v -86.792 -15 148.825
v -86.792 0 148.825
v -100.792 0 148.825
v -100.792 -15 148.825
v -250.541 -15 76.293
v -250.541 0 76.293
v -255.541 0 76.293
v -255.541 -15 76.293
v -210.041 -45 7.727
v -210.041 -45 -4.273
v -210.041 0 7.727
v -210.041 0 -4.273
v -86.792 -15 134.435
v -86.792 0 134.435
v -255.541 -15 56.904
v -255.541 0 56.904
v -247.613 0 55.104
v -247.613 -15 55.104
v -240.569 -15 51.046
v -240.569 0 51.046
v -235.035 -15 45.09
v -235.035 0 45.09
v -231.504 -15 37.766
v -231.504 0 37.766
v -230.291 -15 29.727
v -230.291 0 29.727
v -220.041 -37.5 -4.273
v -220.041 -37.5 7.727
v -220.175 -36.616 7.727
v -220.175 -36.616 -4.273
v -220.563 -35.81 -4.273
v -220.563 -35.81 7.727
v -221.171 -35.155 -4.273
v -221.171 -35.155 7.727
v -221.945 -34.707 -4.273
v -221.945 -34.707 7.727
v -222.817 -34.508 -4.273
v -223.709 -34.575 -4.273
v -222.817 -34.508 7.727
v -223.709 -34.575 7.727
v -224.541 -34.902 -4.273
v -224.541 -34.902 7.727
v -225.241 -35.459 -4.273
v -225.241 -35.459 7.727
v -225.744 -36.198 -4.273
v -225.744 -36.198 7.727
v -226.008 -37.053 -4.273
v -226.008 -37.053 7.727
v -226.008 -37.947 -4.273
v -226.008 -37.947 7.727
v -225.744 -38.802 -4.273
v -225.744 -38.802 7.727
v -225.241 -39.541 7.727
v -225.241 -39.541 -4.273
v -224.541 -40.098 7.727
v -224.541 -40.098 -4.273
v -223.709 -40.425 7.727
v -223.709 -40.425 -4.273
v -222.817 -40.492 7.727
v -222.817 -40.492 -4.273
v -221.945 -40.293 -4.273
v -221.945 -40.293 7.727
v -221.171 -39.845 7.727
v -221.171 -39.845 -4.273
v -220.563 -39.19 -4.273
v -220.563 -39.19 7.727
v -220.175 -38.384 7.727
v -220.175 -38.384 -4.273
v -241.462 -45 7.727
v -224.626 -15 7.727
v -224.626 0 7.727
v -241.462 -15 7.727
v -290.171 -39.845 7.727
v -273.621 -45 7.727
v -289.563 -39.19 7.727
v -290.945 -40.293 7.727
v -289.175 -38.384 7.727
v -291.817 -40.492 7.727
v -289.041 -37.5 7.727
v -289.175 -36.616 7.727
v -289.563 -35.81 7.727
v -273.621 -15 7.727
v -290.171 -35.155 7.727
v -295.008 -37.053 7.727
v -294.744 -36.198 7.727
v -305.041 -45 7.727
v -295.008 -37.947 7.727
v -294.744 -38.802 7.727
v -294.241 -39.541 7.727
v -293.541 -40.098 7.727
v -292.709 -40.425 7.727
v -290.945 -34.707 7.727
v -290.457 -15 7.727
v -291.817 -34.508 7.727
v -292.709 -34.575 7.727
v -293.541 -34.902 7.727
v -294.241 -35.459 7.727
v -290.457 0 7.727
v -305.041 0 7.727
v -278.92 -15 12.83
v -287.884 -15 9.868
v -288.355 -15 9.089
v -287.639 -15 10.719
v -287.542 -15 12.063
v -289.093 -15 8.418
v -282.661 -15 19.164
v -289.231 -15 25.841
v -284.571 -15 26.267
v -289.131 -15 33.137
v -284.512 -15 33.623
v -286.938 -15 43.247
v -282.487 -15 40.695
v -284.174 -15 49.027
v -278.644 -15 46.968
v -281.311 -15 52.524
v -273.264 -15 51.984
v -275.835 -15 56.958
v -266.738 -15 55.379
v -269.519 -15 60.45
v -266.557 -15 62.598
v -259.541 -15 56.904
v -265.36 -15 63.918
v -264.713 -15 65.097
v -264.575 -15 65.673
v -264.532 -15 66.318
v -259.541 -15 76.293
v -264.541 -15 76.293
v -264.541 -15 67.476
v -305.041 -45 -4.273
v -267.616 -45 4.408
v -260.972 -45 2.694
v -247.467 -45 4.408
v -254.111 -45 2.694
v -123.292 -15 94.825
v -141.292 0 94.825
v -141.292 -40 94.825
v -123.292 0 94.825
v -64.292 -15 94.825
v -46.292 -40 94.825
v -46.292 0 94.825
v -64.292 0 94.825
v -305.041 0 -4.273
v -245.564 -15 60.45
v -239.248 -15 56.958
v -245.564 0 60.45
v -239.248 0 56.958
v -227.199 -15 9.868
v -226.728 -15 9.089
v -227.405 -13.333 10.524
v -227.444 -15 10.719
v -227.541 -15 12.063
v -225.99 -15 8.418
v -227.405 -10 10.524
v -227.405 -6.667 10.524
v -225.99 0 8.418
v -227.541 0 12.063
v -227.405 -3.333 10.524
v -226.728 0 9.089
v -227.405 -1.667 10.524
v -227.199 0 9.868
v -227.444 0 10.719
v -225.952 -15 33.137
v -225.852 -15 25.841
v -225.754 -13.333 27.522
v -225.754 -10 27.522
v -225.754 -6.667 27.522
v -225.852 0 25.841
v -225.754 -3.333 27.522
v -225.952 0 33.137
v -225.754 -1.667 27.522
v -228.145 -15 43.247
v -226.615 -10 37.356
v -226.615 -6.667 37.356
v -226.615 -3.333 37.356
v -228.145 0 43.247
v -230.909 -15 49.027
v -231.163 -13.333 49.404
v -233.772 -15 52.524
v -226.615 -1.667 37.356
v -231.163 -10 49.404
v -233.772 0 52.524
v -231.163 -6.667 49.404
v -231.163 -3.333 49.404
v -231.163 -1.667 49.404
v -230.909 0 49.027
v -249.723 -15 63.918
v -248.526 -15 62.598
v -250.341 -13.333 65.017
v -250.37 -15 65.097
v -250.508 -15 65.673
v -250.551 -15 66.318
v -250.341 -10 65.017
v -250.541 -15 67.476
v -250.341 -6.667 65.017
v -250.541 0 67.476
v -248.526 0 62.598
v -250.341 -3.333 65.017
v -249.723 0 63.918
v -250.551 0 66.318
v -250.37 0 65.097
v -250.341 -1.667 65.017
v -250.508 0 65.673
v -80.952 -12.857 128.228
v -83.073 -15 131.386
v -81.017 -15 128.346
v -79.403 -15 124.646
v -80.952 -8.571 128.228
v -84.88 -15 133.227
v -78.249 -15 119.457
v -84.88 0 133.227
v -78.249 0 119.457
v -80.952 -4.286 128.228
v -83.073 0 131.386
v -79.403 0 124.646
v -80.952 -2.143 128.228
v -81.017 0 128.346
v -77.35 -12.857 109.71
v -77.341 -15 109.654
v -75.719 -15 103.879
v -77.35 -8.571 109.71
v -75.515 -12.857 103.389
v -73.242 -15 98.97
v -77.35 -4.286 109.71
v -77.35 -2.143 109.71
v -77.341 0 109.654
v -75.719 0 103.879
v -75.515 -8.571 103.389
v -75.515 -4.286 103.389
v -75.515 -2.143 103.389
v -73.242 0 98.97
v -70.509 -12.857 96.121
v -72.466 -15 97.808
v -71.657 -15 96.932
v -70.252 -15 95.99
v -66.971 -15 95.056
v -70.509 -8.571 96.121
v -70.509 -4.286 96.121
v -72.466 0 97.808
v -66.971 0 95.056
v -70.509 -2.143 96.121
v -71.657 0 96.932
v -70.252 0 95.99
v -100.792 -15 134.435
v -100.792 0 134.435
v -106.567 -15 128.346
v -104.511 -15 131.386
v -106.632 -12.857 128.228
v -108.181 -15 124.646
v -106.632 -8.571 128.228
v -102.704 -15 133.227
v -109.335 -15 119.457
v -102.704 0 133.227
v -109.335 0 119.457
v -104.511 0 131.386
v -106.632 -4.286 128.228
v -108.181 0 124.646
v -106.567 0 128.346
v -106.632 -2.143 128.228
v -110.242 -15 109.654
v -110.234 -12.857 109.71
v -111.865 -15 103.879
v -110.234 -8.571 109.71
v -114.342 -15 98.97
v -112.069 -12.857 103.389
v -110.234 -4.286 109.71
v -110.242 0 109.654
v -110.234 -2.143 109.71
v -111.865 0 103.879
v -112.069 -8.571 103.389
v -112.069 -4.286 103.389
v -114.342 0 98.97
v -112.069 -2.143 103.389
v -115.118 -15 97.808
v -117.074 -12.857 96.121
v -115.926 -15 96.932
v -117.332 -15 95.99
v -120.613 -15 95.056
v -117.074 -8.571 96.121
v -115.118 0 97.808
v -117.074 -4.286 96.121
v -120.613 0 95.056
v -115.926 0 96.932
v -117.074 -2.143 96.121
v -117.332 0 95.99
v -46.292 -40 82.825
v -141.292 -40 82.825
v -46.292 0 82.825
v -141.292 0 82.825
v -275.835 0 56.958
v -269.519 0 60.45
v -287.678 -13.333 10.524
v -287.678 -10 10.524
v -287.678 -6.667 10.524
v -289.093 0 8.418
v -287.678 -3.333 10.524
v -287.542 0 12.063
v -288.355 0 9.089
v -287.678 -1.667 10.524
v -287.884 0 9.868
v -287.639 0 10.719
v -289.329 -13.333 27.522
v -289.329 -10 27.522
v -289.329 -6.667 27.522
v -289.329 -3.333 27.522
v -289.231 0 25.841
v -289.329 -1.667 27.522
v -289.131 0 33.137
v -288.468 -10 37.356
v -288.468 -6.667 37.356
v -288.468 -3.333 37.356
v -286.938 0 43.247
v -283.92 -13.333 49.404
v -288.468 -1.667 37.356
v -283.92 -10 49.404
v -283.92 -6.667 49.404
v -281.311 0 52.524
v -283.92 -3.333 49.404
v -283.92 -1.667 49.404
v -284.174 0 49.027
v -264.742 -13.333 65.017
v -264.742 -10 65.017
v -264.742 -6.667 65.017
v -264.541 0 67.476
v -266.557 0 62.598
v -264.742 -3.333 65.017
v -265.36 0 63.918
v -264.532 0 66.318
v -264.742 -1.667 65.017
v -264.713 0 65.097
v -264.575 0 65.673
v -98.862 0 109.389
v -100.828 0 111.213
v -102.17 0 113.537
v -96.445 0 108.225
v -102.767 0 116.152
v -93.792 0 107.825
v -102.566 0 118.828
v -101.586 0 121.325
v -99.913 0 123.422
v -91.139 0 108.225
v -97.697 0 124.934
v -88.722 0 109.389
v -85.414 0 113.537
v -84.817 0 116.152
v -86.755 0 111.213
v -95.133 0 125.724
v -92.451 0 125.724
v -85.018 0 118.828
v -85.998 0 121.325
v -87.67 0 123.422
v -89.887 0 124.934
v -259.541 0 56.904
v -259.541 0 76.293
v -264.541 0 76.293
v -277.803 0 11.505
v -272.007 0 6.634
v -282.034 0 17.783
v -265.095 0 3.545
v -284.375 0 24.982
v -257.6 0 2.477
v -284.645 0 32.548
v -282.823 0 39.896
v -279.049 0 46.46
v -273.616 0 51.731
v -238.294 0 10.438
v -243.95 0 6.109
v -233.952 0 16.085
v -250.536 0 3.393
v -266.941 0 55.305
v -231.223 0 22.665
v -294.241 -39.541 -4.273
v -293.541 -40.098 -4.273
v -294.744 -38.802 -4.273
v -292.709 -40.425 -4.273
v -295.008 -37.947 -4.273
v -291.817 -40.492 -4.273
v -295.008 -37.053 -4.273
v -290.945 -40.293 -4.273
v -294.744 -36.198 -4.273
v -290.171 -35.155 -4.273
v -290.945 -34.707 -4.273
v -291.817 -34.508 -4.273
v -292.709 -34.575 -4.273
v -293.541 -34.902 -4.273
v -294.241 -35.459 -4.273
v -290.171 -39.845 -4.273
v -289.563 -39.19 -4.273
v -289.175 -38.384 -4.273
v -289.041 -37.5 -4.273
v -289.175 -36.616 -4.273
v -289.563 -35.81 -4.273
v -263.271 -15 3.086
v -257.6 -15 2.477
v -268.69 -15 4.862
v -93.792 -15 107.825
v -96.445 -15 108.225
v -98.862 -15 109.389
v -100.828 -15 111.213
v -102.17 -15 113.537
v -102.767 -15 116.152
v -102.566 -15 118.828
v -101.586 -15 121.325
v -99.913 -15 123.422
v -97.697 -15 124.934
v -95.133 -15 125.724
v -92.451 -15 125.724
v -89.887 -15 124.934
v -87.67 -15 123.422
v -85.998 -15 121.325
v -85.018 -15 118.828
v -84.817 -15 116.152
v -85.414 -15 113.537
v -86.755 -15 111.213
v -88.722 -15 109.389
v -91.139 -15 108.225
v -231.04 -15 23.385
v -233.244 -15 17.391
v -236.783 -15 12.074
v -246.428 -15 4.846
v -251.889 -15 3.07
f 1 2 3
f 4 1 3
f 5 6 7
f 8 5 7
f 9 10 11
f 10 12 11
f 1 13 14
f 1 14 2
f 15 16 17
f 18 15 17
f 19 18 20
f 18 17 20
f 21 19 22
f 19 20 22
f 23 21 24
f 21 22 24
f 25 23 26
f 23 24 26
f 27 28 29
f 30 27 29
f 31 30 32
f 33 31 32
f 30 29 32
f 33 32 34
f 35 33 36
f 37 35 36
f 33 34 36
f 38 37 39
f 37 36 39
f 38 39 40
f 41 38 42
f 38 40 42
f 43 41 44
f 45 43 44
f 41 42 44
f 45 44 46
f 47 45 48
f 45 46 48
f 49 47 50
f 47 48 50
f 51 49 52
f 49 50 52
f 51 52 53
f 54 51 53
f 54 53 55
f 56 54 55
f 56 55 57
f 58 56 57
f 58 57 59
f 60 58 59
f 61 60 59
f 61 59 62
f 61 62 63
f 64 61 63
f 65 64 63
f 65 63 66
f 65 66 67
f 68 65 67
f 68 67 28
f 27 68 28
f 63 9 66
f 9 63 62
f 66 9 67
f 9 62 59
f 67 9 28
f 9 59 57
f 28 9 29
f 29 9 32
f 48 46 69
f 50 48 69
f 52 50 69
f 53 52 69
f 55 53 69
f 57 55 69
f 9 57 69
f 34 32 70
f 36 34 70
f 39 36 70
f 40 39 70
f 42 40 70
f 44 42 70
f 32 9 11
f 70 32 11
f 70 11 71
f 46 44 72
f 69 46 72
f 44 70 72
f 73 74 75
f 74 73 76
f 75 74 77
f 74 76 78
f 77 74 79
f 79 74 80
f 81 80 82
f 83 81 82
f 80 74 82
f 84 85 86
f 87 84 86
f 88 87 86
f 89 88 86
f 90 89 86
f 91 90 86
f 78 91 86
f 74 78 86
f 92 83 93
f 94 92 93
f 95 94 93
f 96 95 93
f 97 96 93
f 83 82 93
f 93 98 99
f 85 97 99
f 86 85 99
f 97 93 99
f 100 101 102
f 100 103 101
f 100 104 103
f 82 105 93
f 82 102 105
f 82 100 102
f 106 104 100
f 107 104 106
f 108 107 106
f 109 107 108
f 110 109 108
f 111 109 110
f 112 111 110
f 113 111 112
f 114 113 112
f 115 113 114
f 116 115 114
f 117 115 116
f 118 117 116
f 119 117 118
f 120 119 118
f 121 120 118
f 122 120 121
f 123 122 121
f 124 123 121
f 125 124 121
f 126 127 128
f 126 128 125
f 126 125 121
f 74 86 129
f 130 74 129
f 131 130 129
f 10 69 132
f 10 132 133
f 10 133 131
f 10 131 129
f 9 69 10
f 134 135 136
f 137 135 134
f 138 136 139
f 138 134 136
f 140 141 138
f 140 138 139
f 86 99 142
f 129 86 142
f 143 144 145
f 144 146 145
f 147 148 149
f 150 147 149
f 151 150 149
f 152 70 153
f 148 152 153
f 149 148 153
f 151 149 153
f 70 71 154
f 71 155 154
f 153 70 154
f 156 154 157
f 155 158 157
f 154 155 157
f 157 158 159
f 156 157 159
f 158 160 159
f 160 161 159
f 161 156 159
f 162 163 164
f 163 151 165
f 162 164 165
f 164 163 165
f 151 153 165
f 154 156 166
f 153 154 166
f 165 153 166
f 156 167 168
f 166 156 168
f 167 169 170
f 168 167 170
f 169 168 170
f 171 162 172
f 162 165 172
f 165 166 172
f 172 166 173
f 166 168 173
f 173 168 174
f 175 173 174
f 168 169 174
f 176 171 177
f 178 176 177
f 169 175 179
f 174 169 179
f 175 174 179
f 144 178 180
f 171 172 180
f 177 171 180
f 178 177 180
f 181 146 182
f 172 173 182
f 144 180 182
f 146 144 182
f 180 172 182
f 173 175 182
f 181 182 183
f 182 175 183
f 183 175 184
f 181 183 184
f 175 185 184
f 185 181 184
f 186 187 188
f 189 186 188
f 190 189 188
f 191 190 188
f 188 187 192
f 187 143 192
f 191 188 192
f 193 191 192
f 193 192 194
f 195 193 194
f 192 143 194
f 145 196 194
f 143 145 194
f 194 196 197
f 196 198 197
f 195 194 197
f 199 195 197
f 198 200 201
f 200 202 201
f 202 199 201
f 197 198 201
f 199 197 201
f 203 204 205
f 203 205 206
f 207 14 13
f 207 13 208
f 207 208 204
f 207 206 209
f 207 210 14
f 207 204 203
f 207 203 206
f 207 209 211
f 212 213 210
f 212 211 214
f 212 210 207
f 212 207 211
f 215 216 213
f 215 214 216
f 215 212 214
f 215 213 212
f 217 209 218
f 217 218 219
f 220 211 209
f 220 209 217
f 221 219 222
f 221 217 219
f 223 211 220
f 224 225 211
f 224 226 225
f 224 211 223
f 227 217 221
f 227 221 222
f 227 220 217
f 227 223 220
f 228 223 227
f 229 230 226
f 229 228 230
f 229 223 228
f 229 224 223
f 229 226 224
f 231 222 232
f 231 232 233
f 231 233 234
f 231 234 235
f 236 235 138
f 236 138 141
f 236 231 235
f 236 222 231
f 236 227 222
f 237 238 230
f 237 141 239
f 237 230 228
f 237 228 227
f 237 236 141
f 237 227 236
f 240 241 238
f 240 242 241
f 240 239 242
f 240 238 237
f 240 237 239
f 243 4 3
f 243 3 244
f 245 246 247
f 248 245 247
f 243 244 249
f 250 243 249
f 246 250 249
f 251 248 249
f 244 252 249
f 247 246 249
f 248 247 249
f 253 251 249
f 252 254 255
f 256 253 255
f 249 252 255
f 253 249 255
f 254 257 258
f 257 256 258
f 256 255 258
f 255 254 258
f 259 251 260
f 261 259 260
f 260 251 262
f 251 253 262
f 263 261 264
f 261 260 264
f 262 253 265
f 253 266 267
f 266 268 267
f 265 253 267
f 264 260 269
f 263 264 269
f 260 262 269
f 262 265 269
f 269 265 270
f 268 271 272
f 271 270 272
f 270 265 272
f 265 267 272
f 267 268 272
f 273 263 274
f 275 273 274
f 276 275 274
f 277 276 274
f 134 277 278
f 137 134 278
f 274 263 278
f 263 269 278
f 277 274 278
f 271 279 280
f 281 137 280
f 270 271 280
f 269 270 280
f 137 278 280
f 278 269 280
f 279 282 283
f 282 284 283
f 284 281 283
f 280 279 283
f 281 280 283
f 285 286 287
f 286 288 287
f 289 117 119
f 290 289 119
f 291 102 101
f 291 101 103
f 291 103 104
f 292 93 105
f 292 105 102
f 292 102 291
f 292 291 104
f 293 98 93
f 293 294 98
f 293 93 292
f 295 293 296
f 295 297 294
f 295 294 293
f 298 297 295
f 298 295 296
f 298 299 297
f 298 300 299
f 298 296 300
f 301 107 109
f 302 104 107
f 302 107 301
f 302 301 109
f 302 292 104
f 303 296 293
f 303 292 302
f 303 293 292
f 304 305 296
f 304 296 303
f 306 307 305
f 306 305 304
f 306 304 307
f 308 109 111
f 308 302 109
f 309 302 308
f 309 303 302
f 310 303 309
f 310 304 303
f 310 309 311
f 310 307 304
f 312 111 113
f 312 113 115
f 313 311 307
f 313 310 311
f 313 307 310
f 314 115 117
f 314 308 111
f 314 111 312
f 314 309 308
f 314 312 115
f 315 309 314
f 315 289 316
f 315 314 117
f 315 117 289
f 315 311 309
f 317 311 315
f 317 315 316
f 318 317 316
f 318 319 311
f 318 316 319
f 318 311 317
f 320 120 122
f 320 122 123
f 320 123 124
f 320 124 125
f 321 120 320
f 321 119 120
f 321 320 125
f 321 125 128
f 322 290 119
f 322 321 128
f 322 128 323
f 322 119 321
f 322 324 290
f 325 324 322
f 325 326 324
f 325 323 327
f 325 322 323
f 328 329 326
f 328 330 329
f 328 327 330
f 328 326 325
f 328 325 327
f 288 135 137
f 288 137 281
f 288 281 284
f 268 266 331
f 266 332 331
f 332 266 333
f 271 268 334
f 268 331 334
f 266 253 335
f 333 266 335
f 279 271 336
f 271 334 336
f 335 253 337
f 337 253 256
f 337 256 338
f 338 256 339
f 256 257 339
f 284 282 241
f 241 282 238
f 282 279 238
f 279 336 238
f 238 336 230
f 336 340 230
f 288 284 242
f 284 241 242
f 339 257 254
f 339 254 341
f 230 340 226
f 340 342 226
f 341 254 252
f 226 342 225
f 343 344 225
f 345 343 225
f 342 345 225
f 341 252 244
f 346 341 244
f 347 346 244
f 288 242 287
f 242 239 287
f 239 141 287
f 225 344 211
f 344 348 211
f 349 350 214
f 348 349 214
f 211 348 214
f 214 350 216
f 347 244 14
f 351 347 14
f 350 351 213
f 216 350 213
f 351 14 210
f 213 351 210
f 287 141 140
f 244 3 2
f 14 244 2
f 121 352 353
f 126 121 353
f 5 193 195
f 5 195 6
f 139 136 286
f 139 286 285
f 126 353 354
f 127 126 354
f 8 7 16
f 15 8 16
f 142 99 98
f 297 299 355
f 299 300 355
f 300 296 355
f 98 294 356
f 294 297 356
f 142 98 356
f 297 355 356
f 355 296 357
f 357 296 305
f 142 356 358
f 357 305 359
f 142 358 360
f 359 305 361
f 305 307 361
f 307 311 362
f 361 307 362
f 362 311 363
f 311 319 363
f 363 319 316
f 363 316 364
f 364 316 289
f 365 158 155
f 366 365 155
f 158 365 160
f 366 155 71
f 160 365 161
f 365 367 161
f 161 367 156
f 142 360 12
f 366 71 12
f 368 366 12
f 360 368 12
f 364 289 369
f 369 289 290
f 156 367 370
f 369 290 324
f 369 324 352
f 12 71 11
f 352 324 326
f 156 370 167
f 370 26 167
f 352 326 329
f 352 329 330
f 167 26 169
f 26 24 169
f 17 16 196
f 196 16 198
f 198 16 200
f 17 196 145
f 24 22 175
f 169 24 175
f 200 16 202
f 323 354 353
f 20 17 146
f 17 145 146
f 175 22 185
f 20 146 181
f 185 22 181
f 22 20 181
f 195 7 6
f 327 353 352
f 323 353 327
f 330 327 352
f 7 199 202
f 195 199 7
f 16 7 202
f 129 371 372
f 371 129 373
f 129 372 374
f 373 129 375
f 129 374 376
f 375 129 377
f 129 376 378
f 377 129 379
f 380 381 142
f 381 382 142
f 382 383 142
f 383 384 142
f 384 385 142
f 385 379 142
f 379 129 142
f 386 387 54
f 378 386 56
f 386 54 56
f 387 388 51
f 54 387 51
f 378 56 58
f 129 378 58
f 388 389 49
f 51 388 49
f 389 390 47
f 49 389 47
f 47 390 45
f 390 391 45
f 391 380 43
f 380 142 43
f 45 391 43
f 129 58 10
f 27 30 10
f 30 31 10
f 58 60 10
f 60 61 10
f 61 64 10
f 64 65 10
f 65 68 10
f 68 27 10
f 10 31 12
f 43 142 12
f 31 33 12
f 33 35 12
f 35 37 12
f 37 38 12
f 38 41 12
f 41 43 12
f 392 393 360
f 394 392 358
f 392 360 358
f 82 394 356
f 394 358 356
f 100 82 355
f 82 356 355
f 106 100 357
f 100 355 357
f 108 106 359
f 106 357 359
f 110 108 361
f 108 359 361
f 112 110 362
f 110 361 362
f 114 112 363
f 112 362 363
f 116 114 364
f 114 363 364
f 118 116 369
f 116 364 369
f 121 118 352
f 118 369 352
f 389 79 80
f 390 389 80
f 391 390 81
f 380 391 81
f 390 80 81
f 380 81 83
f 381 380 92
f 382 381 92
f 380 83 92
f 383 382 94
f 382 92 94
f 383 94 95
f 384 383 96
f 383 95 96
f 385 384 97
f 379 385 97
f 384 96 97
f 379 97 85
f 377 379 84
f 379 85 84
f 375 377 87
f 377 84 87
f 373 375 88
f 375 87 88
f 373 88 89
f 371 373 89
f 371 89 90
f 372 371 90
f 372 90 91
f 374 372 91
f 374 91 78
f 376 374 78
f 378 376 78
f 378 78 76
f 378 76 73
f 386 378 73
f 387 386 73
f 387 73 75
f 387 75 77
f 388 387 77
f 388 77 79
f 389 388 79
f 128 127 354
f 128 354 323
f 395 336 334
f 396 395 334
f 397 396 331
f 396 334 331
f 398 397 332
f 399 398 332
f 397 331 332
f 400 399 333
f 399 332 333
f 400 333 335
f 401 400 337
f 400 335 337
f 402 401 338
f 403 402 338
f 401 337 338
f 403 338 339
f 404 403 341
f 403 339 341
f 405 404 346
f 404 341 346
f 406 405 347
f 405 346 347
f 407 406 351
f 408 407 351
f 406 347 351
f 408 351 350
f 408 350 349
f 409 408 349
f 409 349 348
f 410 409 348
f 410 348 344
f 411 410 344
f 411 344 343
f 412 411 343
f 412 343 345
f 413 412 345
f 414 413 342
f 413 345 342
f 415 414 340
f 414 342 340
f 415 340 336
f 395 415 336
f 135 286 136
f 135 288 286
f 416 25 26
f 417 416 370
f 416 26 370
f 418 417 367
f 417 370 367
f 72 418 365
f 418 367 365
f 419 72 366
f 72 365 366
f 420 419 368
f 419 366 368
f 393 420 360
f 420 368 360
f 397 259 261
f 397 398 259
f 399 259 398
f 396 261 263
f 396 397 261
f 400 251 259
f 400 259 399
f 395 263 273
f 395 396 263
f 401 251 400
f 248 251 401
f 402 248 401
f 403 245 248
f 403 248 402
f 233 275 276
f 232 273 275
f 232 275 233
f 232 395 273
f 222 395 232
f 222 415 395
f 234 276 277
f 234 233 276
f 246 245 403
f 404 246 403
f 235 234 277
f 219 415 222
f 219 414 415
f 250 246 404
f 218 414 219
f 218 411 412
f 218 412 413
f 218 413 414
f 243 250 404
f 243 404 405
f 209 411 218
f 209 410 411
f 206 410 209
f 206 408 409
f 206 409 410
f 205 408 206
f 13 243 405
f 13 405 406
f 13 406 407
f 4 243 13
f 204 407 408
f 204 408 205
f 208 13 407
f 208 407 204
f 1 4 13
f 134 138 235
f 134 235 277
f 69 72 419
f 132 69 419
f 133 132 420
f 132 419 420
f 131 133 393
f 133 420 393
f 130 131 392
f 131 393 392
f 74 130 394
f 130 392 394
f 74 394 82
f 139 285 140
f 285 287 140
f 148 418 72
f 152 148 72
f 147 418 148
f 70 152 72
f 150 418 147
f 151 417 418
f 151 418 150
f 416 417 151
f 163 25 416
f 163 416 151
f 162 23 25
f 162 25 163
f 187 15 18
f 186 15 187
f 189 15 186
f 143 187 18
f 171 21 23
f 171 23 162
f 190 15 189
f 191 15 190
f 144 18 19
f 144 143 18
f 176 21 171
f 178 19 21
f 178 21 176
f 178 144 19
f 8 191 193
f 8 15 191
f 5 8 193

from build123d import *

# Parameters (mm, degrees)
F1_DEPTH = 15
F2_W     = 95
F2_H     = 12
F3_DEPTH = 25
F5_DEPTH = 30
F6_R     = 3
F7_DEPTH = 25


with BuildPart() as f1:
    # F0 (on Front) → F1 (new body)
    with BuildSketch(Plane.XZ):
        with BuildLine():
            Line((-86.7919104606, 148.8248279665), (-93.7919104606, 148.8248279665))
            Line((-93.7919104606, 148.8248279665), (-93.7919104606, 125.8248279665))
            ThreePointArc((-93.7919104606, 125.8248279665), (-84.7919104606, 116.8248279665), (-93.7919104606, 107.8248279665))
            Line((-93.7919104606, 107.8248279665), (-93.7919104606, 82.8248279665))
            Line((-93.7919104606, 82.8248279665), (-46.2919104606, 82.8248279665))
            Line((-46.2919104606, 82.8248279665), (-46.2919104606, 94.8248279665))
            Line((-46.2919104606, 94.8248279665), (-64.2919104606, 94.8248279665))
            add(Edge.make_bspline(
                [(-86.7919104606, 134.4346182567), (-84.6186229965, 133.5189465859), (-80.1312288241, 128.2356920468), (-77.8141041543, 119.2857314457), (-77.824550096, 109.8854181171), (-75.6822417412, 103.3950594754), (-73.7904940331, 99.9910254255), (-71.3124707915, 95.2952731617), (-65.4873071613, 94.8248279665), (-64.2919104606, 94.8248279665)],
                knots=[0, 0, 0, 0, 0.1589153696, 0.3266349591, 0.4941602985, 0.6338202377, 0.7405177517, 0.8628095578, 1, 1, 1, 1], degree=3))
            Line((-86.7919104606, 134.4346182567), (-86.7919104606, 148.8248279665))
        make_face()
        with BuildLine():
            Line((-93.7919104606, 125.8248279665), (-93.7919104606, 148.8248279665))
            Line((-93.7919104606, 148.8248279665), (-100.7919104606, 148.8248279665))
            Line((-100.7919104606, 148.8248279665), (-100.7919104606, 134.4346182567))
            add(Edge.make_bspline(
                [(-100.7919104606, 134.4346182567), (-102.9651979248, 133.5189465859), (-107.4525920971, 128.2356920468), (-109.7697167669, 119.2857314457), (-109.7592708252, 109.8854181171), (-111.90157918, 103.3950594754), (-113.7933268881, 99.9910254255), (-116.2713501297, 95.2952731617), (-122.09651376, 94.8248279665), (-123.2919104606, 94.8248279665)],
                knots=[0, 0, 0, 0, 0.1589153696, 0.3266349591, 0.4941602985, 0.6338202377, 0.7405177517, 0.8628095578, 1, 1, 1, 1], degree=3))
            Line((-123.2919104606, 94.8248279665), (-141.2919104606, 94.8248279665))
            Line((-141.2919104606, 94.8248279665), (-141.2919104606, 82.8248279665))
            Line((-141.2919104606, 82.8248279665), (-93.7919104606, 82.8248279665))
            Line((-93.7919104606, 82.8248279665), (-93.7919104606, 107.8248279665))
            ThreePointArc((-93.7919104606, 107.8248279665), (-102.7919104606, 116.8248279665), (-93.7919104606, 125.8248279665))
        make_face()
    extrude(amount=F1_DEPTH)

    # F2 (on face) → F3 (join)
    with BuildSketch(Plane.XZ.offset(15)):
        with Locations((-93.7919104606, 88.8248279665)):
            Rectangle(F2_W, F2_H)
    extrude(amount=F3_DEPTH)


with BuildPart() as f1b:
    # F0 (on Front) → F1, piece 2 (new body)
    with BuildSketch(Plane.XZ):
        with BuildLine():
            Line((-257.6000979949, -4.2727524898), (-257.6000979949, 2.477310532))
            ThreePointArc((-257.6000979949, 2.477310532), (-284.7741725177, 28.7558565069), (-259.5414917918, 56.9037539082))
            Line((-259.5414917918, 56.9037539082), (-259.5414917918, 76.2926292618))
            Line((-259.5414917918, 76.2926292618), (-264.5414917918, 76.2926292618))
            Line((-264.5414917918, 76.2926292618), (-264.5414917918, 67.4756121834))
            add(Edge.make_bspline(
                [(-290.4570249768, 7.7272475102), (-289.1810761401, 8.2052664847), (-287.0610478005, 9.7665971379), (-288.0067907257, 16.4907230197), (-289.8129929509, 27.7294023947), (-288.7695339108, 37.3587296696), (-285.2655736169, 50.133144334), (-274.6249586166, 58.2213743066), (-268.4604919275, 60.6121886454), (-264.1794193992, 64.7409361805), (-264.5762423932, 66.6883398304), (-264.5414917918, 67.4756121834)],
                knots=[0, 0, 0, 0, 0.0754379169, 0.1766112941, 0.3150596134, 0.4432663677, 0.5896926426, 0.7356900989, 0.8426999539, 0.935912944, 1, 1, 1, 1], degree=3))
            Line((-290.4570249768, 7.7272475102), (-305.0414917918, 7.7272475102))
            Line((-305.0414917918, 7.7272475102), (-305.0414917918, -4.2727524898))
            Line((-305.0414917918, -4.2727524898), (-257.6000979949, -4.2727524898))
        make_face()
        with BuildLine():
            ThreePointArc((-255.5414917918, 56.9037539082), (-237.5782443105, 48.2753269256), (-230.2914917918, 29.7272475102))
            ThreePointArc((-230.2914917918, 29.7272475102), (-238.2935635791, 10.4378784299), (-257.6000979949, 2.477310532))
            Line((-257.6000979949, 2.477310532), (-257.6000979949, -4.2727524898))
            Line((-257.6000979949, -4.2727524898), (-257.4828855888, -4.2727524898))
            Line((-257.4828855888, -4.2727524898), (-210.0414917918, -4.2727524898))
            Line((-210.0414917918, -4.2727524898), (-210.0414917918, 7.7272475102))
            Line((-210.0414917918, 7.7272475102), (-224.6259586068, 7.7272475102))
            add(Edge.make_bspline(
                [(-224.6259586068, 7.7272475102), (-225.9019074436, 8.2052664847), (-228.0219357831, 9.7665971379), (-227.076192858, 16.4907230197), (-225.2699906328, 27.7294023947), (-226.3134496728, 37.3587296696), (-229.8174099667, 50.133144334), (-240.458024967, 58.2213743066), (-246.6224916561, 60.6121886454), (-250.9035641845, 64.7409361805), (-250.5067411904, 66.6883398304), (-250.5414917918, 67.4756121834)],
                knots=[0, 0, 0, 0, 0.0754379169, 0.1766112941, 0.3150596134, 0.4432663677, 0.5896926426, 0.7356900989, 0.8426999539, 0.935912944, 1, 1, 1, 1], degree=3))
            Line((-250.5414917918, 67.4756121834), (-250.5414917918, 76.2926292618))
            Line((-250.5414917918, 76.2926292618), (-255.5414917918, 76.2926292618))
            Line((-255.5414917918, 76.2926292618), (-255.5414917918, 56.9037539082))
        make_face()
    extrude(amount=F1_DEPTH)

    # F4 (on face) → F5 (join)
    with BuildSketch(Plane.XZ.offset(15)):
        with BuildLine():
            Line((-305.0414917918, 7.7272475102), (-305.0414917918, -4.2727524898))
            Line((-305.0414917918, -4.2727524898), (-210.0414917918, -4.2727524898))
            Line((-210.0414917918, -4.2727524898), (-210.0414917918, 7.7272475102))
            Line((-210.0414917918, 7.7272475102), (-224.6259586068, 7.7272475102))
            Line((-224.6259586068, 7.7272475102), (-241.4616130609, 7.7272475102))
            ThreePointArc((-241.4616130609, 7.7272475102), (-257.5414917918, 2.4772475102), (-273.6213705227, 7.7272475102))
            Line((-273.6213705227, 7.7272475102), (-290.4570249768, 7.7272475102))
            Line((-290.4570249768, 7.7272475102), (-305.0414917918, 7.7272475102))
        make_face()
    extrude(amount=F5_DEPTH)

    # F6 (on face) → F7 (cut)
    with BuildSketch(Plane.XY.offset(7.7272475102)):
        with Locations((-292.0414917918, -37.5)):
            Circle(F6_R)
        with Locations((-223.0414917918, -37.5)):
            Circle(F6_R)
    extrude(amount=-F7_DEPTH, mode=Mode.SUBTRACT)


solid = Compound([f1.part, f1b.part])
